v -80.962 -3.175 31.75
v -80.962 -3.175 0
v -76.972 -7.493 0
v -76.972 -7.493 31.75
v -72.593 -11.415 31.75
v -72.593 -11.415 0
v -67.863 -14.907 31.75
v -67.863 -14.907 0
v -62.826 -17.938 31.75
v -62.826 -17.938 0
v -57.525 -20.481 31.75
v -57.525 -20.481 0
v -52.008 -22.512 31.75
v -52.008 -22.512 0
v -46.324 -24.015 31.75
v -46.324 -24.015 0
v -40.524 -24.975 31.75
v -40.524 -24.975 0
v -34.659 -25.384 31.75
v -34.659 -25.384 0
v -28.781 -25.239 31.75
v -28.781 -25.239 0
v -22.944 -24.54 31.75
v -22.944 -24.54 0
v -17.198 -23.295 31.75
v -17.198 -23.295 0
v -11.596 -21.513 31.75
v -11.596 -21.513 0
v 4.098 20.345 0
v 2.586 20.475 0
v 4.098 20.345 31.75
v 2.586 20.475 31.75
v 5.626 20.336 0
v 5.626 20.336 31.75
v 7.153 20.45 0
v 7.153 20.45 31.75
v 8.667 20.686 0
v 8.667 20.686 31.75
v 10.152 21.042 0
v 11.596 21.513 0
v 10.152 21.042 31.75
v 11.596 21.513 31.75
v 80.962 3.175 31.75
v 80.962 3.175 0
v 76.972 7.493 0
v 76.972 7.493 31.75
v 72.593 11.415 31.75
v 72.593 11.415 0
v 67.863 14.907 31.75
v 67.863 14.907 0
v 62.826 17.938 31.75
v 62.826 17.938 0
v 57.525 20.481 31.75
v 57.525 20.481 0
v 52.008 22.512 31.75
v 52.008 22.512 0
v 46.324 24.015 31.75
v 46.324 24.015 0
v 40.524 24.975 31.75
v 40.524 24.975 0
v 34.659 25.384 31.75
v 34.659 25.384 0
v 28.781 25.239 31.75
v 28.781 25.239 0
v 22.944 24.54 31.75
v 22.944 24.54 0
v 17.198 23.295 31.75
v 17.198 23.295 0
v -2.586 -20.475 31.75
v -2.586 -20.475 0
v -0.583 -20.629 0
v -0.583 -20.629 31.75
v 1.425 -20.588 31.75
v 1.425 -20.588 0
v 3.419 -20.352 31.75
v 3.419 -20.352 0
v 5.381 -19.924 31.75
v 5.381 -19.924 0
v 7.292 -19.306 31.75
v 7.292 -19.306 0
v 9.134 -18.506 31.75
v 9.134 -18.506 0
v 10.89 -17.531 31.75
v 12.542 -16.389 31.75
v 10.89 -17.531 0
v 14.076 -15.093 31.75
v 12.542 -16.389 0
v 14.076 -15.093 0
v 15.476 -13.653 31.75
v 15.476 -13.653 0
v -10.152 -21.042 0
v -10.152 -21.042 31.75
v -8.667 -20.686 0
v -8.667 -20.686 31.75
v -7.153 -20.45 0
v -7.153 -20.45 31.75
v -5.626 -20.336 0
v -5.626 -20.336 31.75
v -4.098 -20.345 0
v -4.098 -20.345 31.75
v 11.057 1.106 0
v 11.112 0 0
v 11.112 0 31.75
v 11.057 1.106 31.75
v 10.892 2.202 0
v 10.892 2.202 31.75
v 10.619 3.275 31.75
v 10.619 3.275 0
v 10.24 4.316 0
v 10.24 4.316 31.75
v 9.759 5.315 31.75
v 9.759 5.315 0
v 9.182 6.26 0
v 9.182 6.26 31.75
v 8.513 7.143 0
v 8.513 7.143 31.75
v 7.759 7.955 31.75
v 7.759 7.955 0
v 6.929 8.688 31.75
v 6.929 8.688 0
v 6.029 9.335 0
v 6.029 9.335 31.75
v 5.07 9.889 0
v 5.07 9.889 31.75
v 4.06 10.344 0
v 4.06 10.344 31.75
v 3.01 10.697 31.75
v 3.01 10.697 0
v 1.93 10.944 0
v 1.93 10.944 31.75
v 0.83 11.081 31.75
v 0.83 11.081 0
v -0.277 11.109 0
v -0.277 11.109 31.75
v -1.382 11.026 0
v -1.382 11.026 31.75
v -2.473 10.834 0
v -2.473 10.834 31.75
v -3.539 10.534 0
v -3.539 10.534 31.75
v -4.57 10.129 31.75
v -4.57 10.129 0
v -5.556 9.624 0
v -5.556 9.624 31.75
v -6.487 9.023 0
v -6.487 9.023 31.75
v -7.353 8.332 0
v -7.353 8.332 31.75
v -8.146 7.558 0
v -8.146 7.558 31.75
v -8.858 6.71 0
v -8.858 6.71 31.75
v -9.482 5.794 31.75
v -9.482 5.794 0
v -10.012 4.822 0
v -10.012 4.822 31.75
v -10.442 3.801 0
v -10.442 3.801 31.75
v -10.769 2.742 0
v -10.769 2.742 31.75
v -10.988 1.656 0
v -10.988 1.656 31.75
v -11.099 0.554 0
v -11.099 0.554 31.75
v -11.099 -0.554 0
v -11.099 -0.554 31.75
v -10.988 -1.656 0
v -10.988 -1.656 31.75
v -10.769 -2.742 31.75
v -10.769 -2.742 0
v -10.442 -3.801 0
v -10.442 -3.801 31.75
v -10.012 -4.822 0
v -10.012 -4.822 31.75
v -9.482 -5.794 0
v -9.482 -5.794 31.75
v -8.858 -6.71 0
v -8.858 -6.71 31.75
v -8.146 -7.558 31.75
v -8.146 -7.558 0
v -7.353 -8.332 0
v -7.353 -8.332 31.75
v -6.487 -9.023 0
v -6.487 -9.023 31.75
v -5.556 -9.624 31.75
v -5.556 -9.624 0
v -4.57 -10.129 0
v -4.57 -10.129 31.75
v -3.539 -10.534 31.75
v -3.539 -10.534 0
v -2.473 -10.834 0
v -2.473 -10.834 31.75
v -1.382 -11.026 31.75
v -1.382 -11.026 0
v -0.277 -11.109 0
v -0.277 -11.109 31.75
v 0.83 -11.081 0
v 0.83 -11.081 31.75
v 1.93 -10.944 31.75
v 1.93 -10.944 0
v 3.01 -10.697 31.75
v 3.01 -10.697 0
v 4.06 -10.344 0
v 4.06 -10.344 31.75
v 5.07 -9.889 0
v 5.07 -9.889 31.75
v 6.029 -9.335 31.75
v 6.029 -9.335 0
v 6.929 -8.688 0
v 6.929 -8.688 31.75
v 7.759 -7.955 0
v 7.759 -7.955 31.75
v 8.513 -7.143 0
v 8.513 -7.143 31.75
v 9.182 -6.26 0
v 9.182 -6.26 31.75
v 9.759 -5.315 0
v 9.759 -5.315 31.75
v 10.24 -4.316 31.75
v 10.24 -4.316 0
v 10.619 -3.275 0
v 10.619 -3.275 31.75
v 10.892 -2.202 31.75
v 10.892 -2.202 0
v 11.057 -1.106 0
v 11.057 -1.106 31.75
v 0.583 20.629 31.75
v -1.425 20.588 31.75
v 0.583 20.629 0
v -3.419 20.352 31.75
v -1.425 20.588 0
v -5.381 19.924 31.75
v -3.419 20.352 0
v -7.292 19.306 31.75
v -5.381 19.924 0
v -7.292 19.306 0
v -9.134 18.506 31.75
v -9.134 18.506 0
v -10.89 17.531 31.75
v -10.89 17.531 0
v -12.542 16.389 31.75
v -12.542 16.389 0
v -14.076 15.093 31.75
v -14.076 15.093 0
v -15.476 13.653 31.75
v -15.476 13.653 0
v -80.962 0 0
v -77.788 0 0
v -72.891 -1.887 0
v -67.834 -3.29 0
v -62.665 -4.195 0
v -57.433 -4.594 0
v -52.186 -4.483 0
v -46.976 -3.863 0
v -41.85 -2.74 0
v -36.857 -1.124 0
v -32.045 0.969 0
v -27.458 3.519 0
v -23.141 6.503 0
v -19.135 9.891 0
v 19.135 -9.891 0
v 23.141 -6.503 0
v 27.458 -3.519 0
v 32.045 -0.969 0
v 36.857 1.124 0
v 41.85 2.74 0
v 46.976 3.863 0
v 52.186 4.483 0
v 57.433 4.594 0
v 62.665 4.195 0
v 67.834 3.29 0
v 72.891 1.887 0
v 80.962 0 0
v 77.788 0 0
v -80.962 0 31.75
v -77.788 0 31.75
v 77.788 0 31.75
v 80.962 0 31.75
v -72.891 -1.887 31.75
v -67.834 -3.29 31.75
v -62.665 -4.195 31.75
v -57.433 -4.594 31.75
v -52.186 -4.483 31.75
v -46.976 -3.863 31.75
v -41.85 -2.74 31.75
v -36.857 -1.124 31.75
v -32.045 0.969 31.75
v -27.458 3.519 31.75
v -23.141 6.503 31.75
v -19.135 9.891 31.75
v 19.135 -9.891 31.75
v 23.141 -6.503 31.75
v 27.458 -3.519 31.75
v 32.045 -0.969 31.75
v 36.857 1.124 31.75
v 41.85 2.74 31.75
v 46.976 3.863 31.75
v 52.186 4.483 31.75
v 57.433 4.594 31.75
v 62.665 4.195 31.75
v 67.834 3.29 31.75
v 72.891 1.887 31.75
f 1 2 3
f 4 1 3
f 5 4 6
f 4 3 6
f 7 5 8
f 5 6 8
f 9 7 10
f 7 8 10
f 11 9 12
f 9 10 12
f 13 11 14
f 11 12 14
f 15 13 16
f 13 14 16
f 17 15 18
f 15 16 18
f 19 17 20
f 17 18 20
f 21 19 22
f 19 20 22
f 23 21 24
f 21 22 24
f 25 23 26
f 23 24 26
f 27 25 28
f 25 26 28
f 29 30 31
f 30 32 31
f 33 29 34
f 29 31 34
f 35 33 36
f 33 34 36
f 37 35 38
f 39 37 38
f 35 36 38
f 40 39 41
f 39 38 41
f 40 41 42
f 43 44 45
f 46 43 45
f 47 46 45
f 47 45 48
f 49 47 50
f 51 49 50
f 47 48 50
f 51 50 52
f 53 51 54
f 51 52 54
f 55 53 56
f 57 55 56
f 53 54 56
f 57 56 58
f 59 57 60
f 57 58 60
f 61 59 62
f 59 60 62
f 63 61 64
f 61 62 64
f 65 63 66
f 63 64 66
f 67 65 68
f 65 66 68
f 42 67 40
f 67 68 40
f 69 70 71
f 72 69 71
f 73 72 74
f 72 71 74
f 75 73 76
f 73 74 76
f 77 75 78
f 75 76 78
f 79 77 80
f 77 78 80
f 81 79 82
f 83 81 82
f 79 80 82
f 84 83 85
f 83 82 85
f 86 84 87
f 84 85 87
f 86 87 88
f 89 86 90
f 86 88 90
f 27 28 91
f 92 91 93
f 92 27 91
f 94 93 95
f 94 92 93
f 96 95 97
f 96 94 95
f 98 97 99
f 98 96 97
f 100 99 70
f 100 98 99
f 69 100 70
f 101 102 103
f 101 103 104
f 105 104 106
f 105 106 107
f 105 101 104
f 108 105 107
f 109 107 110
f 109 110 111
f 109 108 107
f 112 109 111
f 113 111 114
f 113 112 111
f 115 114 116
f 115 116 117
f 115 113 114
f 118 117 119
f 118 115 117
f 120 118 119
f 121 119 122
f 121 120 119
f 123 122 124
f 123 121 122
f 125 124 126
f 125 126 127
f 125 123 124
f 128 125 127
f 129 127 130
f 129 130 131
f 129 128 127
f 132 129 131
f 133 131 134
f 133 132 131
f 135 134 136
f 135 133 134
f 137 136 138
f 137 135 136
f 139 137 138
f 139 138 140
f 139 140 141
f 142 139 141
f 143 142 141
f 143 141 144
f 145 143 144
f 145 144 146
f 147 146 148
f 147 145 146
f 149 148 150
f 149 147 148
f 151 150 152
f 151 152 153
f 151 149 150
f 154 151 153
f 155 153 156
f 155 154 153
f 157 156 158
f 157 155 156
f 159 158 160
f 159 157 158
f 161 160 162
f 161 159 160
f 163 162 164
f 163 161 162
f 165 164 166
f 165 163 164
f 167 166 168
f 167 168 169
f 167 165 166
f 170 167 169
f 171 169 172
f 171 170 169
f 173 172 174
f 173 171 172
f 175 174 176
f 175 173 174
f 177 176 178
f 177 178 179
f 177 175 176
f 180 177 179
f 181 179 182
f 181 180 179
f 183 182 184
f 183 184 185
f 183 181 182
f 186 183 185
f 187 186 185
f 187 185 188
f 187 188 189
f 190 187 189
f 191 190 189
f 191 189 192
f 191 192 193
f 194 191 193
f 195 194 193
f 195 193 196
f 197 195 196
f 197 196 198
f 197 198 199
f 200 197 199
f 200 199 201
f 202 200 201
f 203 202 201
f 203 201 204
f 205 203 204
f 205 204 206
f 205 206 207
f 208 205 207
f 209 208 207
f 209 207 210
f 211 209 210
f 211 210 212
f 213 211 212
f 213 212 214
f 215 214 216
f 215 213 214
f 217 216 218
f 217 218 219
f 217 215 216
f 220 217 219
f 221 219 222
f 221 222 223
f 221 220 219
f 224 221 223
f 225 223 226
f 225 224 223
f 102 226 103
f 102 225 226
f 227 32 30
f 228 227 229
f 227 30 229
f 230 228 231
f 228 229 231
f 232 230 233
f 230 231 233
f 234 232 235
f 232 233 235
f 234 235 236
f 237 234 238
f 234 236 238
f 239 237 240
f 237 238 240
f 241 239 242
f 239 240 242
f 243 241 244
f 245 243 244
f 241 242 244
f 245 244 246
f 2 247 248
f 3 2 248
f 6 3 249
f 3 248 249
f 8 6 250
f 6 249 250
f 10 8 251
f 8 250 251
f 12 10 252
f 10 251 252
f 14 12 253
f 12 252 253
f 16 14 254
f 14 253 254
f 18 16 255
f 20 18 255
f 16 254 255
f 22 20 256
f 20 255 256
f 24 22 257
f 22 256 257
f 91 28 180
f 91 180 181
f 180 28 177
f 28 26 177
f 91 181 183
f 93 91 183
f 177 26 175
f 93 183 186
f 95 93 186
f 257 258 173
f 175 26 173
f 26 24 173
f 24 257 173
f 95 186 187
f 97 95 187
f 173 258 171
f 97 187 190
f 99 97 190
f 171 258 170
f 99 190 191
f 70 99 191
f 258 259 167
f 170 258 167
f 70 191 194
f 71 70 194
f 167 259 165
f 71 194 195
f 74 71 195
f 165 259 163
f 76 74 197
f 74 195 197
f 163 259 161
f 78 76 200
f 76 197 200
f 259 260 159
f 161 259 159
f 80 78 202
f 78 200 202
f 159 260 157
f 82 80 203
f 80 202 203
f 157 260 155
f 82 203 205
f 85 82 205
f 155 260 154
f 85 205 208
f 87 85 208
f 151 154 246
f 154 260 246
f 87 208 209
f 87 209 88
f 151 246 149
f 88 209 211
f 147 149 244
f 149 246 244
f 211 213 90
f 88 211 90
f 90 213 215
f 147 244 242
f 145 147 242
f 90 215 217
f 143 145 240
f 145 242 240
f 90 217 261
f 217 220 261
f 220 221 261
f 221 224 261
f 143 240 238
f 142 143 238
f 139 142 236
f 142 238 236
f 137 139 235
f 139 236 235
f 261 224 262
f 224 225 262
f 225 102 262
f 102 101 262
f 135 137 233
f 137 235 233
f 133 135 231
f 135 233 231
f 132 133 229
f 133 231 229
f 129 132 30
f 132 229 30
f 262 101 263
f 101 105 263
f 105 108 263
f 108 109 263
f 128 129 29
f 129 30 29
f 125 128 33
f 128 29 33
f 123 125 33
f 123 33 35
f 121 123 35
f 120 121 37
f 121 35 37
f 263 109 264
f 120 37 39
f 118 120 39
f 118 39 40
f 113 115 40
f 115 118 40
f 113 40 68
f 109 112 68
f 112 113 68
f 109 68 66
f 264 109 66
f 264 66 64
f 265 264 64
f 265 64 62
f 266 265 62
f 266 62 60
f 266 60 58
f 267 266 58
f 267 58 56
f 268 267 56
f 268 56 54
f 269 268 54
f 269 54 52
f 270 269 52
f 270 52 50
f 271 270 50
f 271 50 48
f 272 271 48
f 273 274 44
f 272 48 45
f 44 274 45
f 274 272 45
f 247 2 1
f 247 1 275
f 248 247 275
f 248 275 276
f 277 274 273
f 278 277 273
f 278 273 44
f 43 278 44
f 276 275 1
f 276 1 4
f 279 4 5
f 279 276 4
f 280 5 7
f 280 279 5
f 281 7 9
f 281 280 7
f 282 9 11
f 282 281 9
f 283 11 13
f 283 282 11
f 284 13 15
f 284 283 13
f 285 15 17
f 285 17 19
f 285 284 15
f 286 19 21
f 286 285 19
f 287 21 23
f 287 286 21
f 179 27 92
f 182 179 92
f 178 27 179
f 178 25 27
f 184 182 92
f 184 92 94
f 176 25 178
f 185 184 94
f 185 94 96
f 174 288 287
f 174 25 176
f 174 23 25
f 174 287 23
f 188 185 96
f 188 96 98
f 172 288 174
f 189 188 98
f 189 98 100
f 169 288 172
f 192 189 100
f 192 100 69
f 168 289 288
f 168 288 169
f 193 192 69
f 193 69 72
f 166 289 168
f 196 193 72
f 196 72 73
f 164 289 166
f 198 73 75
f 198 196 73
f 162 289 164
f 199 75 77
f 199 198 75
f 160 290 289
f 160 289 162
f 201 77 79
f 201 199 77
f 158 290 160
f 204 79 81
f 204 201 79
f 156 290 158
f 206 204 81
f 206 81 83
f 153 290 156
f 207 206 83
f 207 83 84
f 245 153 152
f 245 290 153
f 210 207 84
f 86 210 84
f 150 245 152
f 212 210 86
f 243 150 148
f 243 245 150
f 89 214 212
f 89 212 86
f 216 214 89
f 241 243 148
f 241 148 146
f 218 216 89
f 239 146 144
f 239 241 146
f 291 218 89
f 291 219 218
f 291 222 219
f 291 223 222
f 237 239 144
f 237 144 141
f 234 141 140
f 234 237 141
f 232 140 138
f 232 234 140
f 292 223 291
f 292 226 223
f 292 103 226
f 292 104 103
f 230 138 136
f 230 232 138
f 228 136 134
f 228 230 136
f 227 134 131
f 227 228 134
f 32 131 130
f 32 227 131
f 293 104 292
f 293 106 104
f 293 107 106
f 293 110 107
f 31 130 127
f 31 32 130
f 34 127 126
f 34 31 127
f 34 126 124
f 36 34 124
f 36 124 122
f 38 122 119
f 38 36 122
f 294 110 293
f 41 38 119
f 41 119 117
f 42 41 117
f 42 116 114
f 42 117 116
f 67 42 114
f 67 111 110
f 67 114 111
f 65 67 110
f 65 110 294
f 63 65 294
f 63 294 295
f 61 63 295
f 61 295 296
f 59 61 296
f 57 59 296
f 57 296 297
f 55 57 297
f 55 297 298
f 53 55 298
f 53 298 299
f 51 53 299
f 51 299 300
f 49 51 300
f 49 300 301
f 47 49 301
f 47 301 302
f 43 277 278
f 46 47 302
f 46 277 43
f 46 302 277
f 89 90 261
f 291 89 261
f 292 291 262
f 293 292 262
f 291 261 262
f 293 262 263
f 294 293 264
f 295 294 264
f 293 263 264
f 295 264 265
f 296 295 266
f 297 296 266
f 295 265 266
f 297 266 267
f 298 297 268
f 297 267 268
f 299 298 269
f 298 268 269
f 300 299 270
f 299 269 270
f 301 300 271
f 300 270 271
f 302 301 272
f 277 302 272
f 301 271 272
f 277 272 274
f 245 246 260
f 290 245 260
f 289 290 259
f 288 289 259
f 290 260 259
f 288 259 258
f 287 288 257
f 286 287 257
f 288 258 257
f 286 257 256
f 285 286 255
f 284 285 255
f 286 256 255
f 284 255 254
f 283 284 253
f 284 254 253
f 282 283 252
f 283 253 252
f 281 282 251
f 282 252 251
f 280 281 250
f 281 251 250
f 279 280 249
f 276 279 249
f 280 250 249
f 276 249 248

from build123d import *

# Parameters (mm, degrees)
F0_W     = 3.175
F0_H     = 3.175
F1_DEPTH = 31.75
F2_R     = 11.1125
F3_DEPTH = 31.75
F4_R     = 19.05
F5_R     = 19.05


with BuildPart() as f1:
    # F0 (on Top) → F1 (new body)
    with BuildSketch(Plane.XY):
        with BuildLine():
            ThreePointArc((15.475885, -13.652963), (19.304015, -7.298042), (20.6375, 0))
            ThreePointArc((20.6375, 0), (16.81923, 11.959093), (6.777302, 19.492937))
            ThreePointArc((6.777302, 19.492937), (-5.238574, 19.961557), (-15.475885, 13.652963))
            ThreePointArc((-15.475885, 13.652963), (-19.961557, -5.238574), (-6.777302, -19.492937))
            ThreePointArc((-6.777302, -19.492937), (5.238574, -19.961557), (15.475885, -13.652963))
        make_face()
        with BuildLine():
            ThreePointArc((6.777302, 19.492937), (16.81923, 11.959093), (20.6375, 0))
            ThreePointArc((20.6375, 0), (19.304015, -7.298042), (15.475885, -13.652963))
            ThreePointArc((15.475885, -13.652963), (44.398982, 3.363524), (77.7875, 0))
            Line((77.7875, 0), (77.7875, 3.175))
            Line((77.7875, 3.175), (80.9625, 3.175))
            ThreePointArc((80.9625, 3.175), (46.643898, 23.945214), (6.777302, 19.492937))
        make_face()
        with BuildLine():
            ThreePointArc((-6.777302, -19.492937), (-19.961557, -5.238574), (-15.475885, 13.652963))
            ThreePointArc((-15.475885, 13.652963), (-44.398982, -3.363524), (-77.7875, 0))
            Line((-77.7875, 0), (-77.7875, -3.175))
            Line((-77.7875, -3.175), (-80.9625, -3.175))
            ThreePointArc((-80.9625, -3.175), (-46.643898, -23.945214), (-6.777302, -19.492937))
        make_face()
        with Locations((79.375, 1.5875)):
            Rectangle(F0_W, F0_H)
        with Locations((-79.375, -1.5875)):
            Rectangle(F0_W, F0_H)
    extrude(amount=F1_DEPTH)

    # F2 (on Top) → F3 (cut)
    with BuildSketch(Plane.XY):
        Circle(F2_R)
    extrude(amount=F3_DEPTH, mode=Mode.SUBTRACT)

    # F4
    f4_edges = [f1.edges().sort_by_distance(p)[0] for p in [
        (-6.777302, -19.492937, 15.875),
    ]]
    fillet(f4_edges, radius=F4_R)

    # F5
    f5_edges = [f1.edges().sort_by_distance(p)[0] for p in [
        (6.777302, 19.492937, 15.875),
    ]]
    fillet(f5_edges, radius=F5_R)


solid = f1.part
